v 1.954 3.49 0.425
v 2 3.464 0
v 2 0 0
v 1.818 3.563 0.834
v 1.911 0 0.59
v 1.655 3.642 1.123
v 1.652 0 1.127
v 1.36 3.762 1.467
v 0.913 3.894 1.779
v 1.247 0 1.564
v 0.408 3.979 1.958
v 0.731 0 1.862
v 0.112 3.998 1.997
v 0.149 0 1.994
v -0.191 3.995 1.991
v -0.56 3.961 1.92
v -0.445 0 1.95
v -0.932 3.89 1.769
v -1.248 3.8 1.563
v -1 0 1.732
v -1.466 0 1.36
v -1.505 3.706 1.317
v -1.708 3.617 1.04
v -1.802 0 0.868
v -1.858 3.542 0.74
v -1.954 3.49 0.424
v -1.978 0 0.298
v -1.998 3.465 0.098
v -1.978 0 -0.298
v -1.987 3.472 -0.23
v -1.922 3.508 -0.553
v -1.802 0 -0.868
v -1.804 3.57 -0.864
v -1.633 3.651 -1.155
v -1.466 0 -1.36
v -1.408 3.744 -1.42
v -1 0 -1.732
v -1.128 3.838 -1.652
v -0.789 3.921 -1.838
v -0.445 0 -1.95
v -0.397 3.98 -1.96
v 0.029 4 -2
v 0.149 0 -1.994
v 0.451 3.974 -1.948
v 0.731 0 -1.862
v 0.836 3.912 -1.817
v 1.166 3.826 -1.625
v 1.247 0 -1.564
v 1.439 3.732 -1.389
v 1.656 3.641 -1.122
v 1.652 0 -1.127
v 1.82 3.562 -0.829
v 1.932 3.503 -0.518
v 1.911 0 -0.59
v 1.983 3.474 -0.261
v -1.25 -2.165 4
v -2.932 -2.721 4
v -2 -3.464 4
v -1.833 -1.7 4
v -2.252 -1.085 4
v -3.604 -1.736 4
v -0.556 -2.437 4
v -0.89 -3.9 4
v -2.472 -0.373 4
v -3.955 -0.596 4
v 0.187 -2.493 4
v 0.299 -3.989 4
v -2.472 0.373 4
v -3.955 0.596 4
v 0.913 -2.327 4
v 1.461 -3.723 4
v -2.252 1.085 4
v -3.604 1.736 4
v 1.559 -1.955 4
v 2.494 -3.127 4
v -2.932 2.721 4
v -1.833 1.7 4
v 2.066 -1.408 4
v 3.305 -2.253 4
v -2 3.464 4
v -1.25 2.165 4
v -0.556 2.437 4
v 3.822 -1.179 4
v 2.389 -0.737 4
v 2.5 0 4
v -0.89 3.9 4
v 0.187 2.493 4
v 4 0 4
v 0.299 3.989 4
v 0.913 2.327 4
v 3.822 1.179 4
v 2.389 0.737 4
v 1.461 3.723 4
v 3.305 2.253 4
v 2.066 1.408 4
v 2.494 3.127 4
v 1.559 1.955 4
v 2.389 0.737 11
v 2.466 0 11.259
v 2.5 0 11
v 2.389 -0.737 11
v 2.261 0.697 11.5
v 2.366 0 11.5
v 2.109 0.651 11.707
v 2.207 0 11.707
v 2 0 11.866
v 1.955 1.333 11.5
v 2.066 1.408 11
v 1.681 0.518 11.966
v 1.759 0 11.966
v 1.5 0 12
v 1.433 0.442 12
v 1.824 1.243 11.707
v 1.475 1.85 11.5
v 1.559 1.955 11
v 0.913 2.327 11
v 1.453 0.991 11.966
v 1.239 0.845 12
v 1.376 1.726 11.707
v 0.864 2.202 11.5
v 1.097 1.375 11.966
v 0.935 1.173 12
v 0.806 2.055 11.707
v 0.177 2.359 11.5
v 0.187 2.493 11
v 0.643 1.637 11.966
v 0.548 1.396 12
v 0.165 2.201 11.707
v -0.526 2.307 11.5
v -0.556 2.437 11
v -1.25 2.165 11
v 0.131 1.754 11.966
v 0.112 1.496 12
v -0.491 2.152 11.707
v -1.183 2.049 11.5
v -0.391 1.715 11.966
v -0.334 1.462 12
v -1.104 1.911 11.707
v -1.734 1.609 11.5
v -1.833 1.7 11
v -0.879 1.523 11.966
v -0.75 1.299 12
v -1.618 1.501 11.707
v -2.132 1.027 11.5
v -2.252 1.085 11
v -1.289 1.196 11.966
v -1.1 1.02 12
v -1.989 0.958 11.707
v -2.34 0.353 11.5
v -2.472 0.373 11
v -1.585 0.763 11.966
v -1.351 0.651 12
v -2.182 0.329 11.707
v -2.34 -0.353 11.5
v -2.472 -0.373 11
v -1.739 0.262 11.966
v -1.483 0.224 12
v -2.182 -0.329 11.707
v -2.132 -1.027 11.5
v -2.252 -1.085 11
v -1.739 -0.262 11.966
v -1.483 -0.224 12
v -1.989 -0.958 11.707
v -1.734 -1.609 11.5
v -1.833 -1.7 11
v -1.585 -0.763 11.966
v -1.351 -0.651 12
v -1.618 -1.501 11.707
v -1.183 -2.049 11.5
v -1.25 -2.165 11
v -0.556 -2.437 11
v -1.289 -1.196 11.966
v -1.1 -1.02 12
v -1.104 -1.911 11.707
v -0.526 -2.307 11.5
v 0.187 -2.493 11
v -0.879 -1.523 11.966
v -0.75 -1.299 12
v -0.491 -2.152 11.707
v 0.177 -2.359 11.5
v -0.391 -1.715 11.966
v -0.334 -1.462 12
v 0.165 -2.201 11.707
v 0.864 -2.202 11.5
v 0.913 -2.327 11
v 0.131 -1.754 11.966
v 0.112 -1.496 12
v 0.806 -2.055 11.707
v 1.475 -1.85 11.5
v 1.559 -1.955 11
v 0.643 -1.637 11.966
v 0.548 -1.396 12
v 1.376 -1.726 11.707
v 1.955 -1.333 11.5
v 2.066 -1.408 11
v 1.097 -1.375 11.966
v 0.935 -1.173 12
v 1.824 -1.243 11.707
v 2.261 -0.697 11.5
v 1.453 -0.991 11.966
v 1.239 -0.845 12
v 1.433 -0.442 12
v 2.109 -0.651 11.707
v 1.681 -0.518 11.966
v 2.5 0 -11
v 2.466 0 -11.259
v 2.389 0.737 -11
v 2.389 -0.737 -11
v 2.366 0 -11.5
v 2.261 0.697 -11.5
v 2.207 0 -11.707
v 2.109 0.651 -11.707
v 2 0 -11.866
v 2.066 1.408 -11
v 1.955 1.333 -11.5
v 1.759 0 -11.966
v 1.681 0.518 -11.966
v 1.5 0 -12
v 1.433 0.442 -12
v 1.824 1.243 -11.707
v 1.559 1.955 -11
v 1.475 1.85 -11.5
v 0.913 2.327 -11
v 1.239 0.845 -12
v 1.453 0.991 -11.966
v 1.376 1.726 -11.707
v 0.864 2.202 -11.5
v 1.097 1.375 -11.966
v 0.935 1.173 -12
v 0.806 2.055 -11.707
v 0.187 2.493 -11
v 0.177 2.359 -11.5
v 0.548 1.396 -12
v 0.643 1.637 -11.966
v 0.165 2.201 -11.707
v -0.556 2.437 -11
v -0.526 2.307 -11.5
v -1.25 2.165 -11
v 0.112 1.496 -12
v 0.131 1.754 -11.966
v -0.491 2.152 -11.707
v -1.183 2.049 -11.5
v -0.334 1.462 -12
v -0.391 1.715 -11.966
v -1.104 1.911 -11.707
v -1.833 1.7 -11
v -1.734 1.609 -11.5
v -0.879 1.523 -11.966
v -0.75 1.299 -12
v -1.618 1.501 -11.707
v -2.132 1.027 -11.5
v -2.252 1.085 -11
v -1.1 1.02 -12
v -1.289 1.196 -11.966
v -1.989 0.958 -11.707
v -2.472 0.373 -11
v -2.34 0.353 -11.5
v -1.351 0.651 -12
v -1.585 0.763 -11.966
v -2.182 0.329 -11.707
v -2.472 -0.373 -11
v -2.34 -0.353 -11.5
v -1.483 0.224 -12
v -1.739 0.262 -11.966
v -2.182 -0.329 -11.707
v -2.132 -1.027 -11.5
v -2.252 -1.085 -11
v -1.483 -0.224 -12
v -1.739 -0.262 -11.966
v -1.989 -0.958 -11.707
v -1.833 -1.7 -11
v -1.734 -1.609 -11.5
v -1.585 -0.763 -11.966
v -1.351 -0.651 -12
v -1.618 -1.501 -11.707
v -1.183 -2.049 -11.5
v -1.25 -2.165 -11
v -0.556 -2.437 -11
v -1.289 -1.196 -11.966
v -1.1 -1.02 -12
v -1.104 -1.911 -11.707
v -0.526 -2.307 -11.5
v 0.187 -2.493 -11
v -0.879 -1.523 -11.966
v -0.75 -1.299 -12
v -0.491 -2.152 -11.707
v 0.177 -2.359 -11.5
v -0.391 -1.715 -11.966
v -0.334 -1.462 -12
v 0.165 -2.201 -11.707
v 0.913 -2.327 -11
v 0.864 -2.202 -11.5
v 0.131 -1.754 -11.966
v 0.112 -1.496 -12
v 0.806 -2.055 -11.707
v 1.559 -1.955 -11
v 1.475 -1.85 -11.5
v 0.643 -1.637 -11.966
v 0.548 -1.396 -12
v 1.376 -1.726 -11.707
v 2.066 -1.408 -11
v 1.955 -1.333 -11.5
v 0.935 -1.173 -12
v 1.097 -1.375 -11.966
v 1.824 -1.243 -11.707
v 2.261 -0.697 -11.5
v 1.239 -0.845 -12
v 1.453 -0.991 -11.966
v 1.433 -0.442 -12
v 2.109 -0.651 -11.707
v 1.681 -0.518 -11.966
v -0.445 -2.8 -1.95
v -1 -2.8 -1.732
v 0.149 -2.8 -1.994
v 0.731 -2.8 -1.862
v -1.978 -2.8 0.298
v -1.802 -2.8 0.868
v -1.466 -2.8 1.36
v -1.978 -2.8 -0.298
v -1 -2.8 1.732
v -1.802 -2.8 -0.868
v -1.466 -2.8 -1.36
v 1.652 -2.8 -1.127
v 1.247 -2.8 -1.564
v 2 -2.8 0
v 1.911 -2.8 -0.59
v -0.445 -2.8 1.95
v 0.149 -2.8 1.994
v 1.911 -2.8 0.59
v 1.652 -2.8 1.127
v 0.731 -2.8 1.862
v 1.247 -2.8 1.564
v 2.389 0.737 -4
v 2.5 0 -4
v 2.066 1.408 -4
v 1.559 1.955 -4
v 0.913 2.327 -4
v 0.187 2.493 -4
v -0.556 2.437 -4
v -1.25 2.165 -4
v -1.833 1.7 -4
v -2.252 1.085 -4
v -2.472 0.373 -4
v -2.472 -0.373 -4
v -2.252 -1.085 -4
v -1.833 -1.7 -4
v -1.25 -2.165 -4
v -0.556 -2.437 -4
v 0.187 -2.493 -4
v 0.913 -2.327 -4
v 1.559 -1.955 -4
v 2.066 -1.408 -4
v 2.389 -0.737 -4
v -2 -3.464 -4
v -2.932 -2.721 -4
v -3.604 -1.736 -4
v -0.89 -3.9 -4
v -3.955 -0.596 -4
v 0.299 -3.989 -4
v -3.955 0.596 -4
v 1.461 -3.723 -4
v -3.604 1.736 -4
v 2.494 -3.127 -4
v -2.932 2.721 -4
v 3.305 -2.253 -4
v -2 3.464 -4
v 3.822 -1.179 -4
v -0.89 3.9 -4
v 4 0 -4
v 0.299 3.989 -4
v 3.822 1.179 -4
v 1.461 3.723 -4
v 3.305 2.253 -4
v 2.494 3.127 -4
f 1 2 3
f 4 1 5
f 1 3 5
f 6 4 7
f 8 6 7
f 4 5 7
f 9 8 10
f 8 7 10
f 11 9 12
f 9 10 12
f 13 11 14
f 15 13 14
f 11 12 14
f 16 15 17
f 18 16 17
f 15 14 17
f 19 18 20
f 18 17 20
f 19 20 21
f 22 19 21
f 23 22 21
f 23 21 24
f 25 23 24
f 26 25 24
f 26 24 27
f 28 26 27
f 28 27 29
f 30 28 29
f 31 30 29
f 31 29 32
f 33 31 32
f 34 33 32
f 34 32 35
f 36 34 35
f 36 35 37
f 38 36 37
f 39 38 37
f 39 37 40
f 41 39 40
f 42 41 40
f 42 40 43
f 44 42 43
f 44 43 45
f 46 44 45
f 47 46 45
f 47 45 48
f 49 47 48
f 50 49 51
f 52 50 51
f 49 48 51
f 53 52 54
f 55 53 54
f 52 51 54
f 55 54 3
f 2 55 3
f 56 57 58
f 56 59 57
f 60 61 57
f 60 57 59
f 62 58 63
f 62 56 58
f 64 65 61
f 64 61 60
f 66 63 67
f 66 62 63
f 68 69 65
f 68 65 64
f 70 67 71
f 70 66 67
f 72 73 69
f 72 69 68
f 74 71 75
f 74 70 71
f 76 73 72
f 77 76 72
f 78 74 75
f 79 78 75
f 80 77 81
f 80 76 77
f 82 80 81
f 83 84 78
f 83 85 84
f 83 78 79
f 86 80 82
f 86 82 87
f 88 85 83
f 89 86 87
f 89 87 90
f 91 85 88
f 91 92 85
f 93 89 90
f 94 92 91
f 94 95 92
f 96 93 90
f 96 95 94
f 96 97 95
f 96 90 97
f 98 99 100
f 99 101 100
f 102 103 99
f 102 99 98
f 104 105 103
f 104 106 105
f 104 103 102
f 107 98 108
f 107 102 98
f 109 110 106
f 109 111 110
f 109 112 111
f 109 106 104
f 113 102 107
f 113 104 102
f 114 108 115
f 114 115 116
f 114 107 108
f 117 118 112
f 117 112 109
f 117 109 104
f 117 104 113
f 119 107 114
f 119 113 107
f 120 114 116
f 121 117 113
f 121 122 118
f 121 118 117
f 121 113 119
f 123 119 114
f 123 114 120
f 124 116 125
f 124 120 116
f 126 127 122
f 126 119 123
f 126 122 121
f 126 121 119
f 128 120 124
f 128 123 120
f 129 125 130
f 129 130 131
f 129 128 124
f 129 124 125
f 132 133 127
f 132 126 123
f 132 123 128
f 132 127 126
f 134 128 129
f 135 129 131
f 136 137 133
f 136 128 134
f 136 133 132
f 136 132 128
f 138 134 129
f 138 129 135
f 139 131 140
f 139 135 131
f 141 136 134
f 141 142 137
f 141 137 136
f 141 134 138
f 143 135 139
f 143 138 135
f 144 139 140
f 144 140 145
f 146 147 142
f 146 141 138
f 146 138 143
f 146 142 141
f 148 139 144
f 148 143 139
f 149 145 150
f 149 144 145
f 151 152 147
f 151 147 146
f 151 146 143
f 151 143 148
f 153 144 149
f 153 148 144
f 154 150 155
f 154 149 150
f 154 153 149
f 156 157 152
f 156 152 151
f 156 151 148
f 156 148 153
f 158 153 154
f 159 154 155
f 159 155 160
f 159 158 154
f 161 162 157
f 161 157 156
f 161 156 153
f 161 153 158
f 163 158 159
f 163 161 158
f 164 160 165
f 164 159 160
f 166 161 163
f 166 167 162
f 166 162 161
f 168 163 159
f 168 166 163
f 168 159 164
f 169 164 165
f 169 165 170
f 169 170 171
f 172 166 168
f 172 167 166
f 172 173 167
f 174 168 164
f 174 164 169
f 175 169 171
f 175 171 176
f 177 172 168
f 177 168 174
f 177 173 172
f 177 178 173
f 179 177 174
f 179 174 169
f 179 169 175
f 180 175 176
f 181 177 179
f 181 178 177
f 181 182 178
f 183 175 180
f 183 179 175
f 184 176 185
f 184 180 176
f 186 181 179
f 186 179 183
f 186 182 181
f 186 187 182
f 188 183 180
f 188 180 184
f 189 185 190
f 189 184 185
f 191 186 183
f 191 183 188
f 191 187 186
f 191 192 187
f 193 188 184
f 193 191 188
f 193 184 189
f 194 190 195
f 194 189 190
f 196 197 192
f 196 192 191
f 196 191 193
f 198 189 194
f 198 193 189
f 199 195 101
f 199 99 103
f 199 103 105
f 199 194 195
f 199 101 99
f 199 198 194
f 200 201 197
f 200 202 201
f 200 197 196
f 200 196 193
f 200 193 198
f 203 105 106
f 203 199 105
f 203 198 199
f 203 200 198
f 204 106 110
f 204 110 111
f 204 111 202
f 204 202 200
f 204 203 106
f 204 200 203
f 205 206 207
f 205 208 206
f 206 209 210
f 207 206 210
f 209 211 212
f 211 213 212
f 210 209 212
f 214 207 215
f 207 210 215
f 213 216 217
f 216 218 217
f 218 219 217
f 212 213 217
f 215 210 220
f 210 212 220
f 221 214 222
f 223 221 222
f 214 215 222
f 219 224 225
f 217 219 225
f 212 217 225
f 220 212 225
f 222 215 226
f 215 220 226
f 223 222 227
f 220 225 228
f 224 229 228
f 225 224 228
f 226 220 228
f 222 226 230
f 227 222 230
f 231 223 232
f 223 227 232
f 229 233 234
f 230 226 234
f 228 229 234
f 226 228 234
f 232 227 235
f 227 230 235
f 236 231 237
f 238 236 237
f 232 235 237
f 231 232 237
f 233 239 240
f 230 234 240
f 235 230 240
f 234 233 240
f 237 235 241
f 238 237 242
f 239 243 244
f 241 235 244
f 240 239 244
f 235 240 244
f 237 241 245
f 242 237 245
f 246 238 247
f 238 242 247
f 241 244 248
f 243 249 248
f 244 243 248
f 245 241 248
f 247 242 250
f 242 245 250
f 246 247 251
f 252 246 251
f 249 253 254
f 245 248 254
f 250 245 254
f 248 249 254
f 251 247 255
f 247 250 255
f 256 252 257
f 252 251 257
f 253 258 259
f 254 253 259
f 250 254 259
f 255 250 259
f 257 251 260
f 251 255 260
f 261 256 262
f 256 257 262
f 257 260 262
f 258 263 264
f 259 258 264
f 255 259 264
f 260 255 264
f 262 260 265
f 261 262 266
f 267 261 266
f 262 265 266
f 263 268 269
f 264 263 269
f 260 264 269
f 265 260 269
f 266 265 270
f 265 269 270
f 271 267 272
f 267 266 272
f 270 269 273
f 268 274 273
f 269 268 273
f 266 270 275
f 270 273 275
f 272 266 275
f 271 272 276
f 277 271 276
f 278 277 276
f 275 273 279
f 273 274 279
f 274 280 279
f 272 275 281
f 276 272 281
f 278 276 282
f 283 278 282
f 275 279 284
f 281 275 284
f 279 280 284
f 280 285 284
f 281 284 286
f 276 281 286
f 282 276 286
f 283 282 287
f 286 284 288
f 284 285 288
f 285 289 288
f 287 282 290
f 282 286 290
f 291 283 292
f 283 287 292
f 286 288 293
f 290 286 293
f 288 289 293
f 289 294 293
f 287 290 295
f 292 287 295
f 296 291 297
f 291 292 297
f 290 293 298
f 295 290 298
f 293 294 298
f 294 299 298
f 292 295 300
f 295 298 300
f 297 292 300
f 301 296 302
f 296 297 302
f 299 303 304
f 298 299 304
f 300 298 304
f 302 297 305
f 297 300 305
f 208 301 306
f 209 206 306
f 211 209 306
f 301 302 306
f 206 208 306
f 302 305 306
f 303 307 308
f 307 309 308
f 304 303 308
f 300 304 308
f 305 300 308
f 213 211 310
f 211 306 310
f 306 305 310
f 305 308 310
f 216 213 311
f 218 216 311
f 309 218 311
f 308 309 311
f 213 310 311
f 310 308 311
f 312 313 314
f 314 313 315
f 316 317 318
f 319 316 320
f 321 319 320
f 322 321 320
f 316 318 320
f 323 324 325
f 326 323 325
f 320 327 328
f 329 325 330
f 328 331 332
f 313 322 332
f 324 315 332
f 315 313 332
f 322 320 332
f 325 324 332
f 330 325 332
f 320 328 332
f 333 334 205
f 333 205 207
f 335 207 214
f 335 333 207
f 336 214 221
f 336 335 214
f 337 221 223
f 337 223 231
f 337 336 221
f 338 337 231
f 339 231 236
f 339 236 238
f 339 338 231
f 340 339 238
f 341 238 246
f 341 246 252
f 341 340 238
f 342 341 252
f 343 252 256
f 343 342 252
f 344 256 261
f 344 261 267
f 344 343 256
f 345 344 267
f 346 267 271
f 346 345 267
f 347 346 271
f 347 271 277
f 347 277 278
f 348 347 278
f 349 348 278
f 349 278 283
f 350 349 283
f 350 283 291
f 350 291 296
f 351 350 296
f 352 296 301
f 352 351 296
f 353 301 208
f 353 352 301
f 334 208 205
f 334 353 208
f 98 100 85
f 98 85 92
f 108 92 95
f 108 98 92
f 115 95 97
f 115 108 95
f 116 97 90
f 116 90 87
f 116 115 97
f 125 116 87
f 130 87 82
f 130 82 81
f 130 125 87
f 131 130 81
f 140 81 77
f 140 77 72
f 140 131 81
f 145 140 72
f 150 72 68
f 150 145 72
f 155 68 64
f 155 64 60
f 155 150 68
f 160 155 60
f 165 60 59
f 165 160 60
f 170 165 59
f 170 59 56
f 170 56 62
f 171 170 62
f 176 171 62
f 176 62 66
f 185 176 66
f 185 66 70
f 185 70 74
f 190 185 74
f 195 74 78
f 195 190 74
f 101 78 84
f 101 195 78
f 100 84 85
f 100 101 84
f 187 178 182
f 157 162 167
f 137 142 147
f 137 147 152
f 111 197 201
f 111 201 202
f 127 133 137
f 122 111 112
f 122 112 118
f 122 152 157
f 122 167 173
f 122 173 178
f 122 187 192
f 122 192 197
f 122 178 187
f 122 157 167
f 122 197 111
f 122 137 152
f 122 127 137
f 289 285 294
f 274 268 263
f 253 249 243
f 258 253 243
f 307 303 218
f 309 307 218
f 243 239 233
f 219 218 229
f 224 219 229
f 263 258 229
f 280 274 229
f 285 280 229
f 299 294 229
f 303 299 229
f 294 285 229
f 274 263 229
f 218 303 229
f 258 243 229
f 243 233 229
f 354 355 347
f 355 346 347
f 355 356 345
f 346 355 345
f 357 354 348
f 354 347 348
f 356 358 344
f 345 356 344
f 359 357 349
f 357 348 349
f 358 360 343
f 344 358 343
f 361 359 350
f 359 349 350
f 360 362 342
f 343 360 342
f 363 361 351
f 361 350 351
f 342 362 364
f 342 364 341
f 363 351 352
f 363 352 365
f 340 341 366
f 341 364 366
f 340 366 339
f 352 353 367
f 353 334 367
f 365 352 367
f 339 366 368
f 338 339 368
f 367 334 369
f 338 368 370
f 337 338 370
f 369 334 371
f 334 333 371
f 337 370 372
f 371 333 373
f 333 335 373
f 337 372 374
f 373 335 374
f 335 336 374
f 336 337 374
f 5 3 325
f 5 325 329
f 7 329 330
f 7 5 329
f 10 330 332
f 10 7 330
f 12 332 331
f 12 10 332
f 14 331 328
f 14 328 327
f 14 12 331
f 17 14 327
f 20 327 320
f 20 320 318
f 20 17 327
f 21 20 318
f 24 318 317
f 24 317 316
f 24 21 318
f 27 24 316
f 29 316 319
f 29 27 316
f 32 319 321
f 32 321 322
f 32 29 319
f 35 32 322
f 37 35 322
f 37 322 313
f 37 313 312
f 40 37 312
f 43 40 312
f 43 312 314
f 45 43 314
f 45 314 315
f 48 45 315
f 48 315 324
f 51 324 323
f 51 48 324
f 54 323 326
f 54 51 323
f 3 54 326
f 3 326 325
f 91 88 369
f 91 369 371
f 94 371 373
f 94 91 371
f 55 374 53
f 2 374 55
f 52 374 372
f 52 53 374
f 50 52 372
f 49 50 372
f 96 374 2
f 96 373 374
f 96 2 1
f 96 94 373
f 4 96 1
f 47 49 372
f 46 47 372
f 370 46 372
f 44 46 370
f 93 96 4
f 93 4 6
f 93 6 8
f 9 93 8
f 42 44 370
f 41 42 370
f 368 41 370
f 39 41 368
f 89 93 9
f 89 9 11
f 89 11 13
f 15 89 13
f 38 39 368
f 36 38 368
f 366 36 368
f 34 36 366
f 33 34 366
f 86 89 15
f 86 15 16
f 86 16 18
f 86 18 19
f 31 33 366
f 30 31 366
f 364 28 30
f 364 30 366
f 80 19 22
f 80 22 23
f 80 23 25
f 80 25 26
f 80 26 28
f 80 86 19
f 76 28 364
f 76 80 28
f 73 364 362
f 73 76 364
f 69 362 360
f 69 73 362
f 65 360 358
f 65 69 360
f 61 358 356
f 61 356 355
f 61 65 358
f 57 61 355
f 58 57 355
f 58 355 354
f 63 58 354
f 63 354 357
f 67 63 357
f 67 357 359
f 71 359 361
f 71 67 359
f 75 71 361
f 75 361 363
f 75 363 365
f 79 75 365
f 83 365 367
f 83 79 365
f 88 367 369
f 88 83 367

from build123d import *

# Parameters (mm, degrees)
F0_R     = 2.5
F1_DEPTH = 12
F2_DEPTH = 12
F0_R_2   = 4
F3_DEPTH = 4
F4_DEPTH = 4
F5_R     = 1
F6_R     = 2
F7_DEPTH = 4.2
F8_DEPTH = 2.8


with BuildPart() as f1:
    # F0 (on Top) → F1 (new body)
    with BuildSketch(Plane.XY):
        Circle(F0_R)
    extrude(amount=F1_DEPTH)

    # F0 (on Top) → F2 (join)
    with BuildSketch(Plane.XY):
        Circle(F0_R)
    extrude(amount=-F2_DEPTH)

    # F0 (on Top) → F3 (join)
    with BuildSketch(Plane.XY):
        Circle(F0_R_2)
        Circle(F0_R, mode=Mode.SUBTRACT)
    extrude(amount=F3_DEPTH)

    # F0 (on Top) → F4 (join)
    with BuildSketch(Plane.XY):
        Circle(F0_R_2)
        Circle(F0_R, mode=Mode.SUBTRACT)
    extrude(amount=-F4_DEPTH)

    # F5
    f5_edges = [f1.edges().sort_by_distance(p)[0] for p in [
        (-2.5, 0, 12),
        (-2.5, 0, -12),
    ]]
    fillet(f5_edges, radius=F5_R)

    # F6 (on Front) → F7 (cut)
    with BuildSketch(Plane.XZ):
        Circle(F6_R)
    extrude(amount=-F7_DEPTH, mode=Mode.SUBTRACT)

    # F6 (on Front) → F8 (cut)
    with BuildSketch(Plane.XZ):
        Circle(F6_R)
    extrude(amount=F8_DEPTH, mode=Mode.SUBTRACT)


solid = f1.part
